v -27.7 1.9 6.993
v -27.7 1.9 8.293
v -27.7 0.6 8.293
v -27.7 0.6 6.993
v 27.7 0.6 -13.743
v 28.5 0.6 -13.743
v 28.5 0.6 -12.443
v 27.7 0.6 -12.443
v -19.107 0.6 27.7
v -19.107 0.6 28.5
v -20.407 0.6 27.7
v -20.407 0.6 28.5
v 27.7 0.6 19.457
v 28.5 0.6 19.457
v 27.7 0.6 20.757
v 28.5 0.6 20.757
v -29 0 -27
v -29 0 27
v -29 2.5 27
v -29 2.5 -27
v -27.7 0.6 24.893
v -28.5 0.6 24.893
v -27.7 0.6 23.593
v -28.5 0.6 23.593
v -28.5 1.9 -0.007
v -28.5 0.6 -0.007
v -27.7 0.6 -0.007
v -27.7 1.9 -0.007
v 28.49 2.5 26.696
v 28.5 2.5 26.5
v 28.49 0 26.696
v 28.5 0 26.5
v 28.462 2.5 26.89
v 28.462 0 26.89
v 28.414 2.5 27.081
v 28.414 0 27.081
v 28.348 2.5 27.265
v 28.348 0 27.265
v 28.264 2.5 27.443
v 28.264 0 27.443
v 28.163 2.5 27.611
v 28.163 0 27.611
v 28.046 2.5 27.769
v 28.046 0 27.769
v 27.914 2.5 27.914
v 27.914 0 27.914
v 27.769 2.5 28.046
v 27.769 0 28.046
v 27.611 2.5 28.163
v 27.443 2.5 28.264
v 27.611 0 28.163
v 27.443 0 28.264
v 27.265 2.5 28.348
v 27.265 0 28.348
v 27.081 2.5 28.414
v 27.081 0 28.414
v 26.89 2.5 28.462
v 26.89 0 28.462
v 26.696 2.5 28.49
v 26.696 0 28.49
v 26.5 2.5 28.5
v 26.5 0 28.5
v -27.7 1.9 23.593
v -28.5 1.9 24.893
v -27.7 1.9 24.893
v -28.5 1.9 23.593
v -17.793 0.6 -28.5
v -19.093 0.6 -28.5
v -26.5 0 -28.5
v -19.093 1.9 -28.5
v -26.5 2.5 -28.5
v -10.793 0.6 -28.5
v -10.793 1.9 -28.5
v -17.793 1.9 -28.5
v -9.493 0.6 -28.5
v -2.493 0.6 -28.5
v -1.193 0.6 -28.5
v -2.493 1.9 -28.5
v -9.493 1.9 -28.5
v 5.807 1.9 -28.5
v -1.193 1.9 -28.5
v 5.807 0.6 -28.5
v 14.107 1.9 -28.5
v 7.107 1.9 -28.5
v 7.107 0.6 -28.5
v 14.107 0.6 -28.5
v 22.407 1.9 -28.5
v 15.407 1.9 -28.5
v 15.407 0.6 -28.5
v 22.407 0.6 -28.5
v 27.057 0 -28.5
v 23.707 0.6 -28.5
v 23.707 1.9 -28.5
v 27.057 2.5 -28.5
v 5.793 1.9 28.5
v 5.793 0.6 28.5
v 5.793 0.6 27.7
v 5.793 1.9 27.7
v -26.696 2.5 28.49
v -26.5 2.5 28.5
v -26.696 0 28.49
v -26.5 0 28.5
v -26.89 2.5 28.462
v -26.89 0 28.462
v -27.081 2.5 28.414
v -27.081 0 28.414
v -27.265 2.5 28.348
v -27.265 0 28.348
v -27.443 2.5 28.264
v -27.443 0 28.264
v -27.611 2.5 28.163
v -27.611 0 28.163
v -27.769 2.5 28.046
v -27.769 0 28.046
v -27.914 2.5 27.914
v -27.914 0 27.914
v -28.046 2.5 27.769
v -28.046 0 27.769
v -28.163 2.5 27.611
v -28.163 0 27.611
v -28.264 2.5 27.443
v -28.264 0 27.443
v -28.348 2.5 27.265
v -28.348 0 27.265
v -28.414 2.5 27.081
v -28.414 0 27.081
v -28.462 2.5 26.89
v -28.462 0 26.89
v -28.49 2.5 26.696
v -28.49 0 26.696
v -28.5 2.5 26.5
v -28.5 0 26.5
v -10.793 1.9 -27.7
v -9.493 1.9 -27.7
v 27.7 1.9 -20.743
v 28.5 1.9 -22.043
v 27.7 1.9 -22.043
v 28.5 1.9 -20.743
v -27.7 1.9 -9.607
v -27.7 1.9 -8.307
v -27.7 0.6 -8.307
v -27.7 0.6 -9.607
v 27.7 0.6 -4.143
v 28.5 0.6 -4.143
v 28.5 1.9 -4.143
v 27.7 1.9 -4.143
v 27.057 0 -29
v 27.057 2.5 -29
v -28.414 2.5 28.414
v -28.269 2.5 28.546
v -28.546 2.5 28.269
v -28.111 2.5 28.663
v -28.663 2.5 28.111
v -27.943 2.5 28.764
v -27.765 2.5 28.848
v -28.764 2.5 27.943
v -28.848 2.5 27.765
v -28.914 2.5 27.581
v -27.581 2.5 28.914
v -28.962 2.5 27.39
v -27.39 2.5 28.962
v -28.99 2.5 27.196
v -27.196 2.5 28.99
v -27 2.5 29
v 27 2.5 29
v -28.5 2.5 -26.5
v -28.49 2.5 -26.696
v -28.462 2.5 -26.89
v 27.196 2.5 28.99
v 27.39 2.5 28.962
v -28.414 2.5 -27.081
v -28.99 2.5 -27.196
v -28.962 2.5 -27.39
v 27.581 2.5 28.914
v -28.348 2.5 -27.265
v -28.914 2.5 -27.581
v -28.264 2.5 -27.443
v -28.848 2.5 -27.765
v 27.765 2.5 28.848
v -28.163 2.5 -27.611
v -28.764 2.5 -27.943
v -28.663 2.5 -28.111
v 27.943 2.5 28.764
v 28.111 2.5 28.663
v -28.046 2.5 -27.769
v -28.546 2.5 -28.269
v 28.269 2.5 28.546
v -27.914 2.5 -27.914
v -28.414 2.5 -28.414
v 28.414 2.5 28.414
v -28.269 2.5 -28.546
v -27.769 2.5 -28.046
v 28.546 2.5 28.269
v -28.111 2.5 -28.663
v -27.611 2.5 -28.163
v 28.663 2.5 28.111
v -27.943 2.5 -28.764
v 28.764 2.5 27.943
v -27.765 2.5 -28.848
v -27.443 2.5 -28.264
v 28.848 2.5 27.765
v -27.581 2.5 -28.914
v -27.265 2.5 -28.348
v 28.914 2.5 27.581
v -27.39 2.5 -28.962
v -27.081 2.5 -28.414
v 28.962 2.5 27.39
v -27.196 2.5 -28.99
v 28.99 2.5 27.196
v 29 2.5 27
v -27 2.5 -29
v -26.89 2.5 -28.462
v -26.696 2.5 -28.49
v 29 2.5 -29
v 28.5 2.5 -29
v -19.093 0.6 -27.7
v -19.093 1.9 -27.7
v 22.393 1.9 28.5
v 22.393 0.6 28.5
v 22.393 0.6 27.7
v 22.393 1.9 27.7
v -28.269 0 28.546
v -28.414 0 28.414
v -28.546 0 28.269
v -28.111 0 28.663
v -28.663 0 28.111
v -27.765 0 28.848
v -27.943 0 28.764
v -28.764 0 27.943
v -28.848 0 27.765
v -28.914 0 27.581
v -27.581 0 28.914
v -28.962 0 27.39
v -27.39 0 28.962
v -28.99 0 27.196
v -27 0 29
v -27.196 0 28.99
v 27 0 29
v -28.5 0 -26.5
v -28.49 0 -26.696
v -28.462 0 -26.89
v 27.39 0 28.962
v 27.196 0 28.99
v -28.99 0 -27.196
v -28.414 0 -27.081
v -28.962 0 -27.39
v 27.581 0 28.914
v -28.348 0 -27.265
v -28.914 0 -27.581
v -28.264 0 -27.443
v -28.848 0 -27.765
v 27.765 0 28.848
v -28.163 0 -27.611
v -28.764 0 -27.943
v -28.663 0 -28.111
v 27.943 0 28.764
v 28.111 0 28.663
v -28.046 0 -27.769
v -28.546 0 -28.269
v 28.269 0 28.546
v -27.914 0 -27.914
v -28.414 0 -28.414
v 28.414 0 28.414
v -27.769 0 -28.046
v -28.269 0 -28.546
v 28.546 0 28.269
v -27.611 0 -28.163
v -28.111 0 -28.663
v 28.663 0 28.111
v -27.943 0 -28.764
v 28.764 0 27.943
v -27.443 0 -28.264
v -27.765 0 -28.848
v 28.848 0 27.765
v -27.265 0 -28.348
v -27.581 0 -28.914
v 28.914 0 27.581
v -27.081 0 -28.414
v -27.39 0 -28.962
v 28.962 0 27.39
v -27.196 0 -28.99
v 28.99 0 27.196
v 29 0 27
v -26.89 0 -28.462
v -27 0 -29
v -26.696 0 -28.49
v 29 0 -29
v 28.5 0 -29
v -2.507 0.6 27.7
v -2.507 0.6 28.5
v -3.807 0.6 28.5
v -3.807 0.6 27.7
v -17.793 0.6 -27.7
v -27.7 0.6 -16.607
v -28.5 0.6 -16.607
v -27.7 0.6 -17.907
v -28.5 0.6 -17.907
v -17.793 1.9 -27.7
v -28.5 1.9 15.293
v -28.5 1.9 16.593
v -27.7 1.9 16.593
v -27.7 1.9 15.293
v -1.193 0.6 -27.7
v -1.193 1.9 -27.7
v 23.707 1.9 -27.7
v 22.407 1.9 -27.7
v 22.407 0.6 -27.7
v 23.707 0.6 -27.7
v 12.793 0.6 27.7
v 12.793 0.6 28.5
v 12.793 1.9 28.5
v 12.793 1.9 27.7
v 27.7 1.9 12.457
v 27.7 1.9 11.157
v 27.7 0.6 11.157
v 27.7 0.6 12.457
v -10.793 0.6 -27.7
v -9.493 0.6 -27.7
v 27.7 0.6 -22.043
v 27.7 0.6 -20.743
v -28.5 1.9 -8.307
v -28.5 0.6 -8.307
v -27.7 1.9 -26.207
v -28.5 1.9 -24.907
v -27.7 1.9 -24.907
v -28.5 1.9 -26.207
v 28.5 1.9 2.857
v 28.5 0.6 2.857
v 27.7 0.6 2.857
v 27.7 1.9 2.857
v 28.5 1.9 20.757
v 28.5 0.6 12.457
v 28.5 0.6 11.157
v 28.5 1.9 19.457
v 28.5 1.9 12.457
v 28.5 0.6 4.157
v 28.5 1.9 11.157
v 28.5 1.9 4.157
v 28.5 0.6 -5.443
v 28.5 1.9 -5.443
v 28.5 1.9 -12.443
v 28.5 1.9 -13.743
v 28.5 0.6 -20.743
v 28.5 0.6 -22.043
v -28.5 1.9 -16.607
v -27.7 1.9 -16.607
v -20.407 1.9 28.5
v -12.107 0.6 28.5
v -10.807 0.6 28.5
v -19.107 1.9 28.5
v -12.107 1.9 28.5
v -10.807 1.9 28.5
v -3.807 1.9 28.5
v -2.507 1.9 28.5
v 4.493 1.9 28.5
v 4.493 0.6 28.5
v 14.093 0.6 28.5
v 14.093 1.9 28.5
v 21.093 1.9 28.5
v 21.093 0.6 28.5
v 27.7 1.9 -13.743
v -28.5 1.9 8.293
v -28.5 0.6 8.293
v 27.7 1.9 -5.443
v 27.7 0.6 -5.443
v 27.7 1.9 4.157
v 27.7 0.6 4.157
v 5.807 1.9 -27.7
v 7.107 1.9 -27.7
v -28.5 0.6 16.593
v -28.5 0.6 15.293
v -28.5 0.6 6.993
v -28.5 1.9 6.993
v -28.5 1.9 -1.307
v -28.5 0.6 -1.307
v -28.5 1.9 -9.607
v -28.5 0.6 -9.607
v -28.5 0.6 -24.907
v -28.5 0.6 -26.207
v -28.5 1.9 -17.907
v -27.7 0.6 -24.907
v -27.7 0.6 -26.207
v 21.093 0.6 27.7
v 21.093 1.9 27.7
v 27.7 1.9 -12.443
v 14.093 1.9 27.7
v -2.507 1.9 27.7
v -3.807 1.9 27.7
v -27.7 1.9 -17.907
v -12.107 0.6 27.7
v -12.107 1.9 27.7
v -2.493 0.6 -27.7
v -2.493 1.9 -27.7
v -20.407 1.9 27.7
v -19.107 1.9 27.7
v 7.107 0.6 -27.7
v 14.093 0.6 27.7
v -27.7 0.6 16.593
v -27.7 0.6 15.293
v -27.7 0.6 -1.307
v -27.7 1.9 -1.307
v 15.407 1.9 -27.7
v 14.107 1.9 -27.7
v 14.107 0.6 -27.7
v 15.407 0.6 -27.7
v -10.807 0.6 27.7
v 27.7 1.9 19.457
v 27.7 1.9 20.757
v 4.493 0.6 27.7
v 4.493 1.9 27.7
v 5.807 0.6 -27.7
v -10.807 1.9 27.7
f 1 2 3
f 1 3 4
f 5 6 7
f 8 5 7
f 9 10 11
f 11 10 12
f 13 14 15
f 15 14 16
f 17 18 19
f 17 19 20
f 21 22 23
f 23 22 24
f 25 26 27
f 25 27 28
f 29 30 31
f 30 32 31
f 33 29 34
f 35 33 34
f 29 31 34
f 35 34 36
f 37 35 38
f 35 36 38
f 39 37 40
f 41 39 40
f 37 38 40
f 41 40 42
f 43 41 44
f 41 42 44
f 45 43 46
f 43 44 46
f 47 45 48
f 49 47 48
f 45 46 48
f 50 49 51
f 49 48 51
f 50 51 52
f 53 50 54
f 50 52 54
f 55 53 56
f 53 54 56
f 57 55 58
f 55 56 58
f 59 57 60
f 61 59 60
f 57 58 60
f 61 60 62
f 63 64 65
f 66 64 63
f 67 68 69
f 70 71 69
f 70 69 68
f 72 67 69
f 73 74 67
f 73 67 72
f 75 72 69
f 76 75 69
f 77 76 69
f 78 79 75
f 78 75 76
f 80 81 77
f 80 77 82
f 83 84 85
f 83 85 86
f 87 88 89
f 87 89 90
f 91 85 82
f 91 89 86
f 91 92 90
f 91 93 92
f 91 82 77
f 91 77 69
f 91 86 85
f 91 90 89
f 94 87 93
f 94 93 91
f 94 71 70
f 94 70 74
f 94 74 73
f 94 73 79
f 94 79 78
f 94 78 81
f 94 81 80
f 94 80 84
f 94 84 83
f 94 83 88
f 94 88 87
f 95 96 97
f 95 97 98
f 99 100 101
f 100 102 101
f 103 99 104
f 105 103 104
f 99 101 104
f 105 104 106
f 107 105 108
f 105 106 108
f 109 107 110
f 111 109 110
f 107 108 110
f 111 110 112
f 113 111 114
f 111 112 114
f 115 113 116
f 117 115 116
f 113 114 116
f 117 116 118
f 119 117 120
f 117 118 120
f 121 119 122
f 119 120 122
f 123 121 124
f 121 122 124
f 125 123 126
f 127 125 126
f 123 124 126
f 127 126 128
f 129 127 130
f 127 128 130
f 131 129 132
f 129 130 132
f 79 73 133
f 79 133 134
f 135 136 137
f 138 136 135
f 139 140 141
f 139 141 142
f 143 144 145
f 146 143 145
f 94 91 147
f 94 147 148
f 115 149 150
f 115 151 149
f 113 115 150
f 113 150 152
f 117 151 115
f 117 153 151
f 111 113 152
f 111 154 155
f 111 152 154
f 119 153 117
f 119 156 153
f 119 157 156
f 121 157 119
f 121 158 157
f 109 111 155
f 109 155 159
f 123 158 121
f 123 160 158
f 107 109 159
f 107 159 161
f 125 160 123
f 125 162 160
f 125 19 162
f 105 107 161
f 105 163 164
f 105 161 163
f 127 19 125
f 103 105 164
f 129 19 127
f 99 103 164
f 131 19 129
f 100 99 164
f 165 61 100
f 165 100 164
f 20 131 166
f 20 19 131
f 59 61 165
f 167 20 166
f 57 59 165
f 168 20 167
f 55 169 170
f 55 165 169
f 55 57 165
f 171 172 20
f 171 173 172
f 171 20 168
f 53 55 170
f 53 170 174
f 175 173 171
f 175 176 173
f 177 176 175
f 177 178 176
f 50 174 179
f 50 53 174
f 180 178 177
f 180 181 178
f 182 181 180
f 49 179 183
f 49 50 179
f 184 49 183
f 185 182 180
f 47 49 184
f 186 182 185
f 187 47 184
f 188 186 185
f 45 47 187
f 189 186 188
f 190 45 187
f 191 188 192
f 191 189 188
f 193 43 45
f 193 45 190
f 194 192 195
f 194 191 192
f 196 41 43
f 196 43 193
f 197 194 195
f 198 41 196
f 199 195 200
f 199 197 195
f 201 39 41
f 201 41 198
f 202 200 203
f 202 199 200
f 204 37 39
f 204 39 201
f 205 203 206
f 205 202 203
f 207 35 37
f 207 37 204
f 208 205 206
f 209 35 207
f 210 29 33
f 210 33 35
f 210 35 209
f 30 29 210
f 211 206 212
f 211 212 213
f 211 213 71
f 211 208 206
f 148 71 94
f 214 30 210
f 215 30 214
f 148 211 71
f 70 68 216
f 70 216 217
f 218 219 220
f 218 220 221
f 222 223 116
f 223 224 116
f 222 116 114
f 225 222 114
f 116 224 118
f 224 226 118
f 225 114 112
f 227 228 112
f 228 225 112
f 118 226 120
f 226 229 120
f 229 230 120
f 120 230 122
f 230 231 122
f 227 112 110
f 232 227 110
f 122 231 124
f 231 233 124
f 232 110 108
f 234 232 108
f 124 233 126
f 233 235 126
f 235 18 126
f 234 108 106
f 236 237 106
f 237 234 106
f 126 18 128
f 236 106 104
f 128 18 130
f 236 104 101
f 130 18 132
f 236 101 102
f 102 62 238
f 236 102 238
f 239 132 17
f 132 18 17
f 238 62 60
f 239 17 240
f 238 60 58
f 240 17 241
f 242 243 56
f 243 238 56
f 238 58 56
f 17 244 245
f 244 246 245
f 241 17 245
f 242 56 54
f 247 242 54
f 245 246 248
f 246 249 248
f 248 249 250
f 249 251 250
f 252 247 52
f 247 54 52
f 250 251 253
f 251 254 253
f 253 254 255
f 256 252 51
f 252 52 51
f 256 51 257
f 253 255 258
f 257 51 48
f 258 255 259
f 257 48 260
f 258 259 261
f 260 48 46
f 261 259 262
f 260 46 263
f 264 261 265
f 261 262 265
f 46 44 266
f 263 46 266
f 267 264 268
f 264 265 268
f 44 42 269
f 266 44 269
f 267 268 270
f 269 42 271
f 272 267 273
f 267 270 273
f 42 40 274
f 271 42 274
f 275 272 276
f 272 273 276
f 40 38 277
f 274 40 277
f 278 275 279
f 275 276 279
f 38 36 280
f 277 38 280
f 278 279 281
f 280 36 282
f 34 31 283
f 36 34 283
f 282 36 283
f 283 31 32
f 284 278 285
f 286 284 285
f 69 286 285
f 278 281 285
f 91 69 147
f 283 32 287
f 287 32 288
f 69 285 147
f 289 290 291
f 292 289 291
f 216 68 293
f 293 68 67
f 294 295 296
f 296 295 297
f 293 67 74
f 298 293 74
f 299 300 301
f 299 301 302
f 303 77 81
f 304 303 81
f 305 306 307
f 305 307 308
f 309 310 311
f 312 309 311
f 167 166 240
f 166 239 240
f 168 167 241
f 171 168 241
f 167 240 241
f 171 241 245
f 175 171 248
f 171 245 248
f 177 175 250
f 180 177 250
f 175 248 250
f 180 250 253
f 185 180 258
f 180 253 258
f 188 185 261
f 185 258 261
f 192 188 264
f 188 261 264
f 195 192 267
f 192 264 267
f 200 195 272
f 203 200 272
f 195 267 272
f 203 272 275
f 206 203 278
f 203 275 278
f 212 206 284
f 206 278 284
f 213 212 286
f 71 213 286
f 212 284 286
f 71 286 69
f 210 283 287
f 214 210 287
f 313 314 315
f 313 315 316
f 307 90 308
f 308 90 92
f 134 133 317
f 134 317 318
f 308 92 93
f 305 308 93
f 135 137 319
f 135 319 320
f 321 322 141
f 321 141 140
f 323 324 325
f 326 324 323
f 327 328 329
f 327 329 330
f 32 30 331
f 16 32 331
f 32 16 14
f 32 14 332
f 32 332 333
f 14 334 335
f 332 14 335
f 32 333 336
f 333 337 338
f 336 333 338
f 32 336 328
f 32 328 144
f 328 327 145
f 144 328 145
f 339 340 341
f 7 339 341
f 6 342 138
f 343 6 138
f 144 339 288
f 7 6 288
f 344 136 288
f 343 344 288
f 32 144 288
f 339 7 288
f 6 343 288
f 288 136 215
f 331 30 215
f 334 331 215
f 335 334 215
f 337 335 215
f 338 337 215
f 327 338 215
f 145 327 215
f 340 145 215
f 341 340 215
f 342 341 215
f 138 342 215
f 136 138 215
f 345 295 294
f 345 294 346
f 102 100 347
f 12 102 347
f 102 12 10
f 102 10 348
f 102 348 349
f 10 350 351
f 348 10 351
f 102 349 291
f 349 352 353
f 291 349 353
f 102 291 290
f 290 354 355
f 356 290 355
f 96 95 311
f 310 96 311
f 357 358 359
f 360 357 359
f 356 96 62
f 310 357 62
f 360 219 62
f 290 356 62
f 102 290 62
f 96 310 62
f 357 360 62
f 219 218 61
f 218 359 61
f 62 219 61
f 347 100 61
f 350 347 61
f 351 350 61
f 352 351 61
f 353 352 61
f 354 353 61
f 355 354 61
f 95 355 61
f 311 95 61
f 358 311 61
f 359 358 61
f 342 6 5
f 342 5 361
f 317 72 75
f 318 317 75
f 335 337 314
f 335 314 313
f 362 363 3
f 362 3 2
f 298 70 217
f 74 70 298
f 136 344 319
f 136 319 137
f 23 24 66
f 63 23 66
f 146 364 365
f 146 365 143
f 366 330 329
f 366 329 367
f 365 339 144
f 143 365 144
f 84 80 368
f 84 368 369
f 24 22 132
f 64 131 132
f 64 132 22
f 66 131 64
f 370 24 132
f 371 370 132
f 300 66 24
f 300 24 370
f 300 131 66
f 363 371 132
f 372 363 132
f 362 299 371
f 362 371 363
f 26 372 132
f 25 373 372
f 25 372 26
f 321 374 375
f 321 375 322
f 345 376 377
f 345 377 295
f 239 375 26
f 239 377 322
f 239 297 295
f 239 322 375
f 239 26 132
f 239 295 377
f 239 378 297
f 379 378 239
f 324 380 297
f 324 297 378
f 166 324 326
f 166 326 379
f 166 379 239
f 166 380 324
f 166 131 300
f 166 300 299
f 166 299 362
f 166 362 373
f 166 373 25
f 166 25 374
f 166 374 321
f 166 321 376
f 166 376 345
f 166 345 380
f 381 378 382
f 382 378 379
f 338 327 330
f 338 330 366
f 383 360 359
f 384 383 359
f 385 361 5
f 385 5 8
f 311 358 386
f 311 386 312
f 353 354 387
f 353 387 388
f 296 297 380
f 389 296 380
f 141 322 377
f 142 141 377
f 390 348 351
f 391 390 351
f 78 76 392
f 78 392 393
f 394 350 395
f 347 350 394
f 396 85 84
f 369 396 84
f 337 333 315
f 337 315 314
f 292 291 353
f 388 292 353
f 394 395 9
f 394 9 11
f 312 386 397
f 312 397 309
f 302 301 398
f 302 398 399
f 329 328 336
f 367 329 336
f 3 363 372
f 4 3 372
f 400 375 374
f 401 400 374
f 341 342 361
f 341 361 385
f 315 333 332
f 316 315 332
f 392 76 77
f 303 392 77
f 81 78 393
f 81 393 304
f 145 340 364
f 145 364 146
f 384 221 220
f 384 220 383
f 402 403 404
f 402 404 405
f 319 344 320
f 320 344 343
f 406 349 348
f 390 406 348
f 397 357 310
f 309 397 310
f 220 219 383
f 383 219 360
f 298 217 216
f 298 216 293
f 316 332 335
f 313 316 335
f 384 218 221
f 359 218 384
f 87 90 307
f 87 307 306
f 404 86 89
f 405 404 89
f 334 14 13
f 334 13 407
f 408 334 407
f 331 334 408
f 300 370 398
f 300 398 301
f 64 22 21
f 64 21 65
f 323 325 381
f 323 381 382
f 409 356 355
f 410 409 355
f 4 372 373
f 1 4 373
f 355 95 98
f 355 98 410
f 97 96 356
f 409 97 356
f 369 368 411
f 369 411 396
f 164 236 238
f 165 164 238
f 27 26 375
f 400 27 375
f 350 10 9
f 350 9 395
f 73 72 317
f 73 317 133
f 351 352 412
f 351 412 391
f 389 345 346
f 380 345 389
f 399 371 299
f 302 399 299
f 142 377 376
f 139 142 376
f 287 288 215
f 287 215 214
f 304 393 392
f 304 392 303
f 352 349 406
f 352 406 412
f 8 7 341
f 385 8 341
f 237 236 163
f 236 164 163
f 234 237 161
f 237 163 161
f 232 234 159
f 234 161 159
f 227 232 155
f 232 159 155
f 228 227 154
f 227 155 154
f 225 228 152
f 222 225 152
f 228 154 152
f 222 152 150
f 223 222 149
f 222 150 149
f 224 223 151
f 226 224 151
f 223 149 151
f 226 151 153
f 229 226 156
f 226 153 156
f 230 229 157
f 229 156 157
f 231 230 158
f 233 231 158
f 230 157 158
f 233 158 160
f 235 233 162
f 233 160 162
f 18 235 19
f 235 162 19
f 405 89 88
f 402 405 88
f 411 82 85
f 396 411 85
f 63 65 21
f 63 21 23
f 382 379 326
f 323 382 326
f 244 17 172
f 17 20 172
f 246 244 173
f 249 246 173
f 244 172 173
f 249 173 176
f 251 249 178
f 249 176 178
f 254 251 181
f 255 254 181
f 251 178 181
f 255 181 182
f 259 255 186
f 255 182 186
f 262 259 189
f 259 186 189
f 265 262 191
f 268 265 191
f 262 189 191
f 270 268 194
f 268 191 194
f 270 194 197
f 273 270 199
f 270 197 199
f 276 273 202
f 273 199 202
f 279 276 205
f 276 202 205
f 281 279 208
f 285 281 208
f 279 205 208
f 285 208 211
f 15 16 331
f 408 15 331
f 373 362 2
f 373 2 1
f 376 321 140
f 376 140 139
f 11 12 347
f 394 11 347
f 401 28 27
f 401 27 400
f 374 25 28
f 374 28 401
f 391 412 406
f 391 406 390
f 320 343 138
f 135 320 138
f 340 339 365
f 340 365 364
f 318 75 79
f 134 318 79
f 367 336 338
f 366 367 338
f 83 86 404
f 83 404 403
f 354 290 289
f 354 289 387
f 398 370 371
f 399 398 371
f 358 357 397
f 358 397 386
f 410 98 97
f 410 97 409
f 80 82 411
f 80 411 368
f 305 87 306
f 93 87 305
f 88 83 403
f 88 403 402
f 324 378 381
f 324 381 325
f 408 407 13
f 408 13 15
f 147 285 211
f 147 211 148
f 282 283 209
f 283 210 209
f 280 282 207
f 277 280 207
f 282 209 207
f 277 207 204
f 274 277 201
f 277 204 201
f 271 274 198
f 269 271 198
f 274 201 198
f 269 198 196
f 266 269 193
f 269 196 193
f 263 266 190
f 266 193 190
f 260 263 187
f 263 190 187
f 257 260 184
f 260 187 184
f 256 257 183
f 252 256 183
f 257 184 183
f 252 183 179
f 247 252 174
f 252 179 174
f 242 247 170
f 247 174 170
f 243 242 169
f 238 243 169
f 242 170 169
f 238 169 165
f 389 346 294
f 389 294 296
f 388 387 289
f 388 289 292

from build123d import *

# Parameters (mm, degrees)
SKETCH_1_W               = 58
SKETCH_1_H               = 58
EXTRUDE_1_DEPTH          = 2.5
SKETCH_2_W               = 57
SKETCH_2_H               = 57
CUT_EXTRUDE_7_DEPTH      = 1
CUT_EXTRUDE_7_DEPTH_BACK = 3.5
SKETCH_5_W               = 1.4427437
SKETCH_5_H               = 2.5
CUT_EXTRUDE_8_DEPTH      = 1.5
SKETCH_6_W               = 1.3
SKETCH_6_H               = 1.3
EXTRUDE_5_DEPTH          = 0.8
FILLET_4_R               = 2
FILLET_5_R               = 2
SKETCH_8_W               = 1.3
SKETCH_8_H               = 1.3
EXTRUDE_6_DEPTH          = 0.8
SKETCH_10_W              = 1.3
SKETCH_10_H              = 1.3
EXTRUDE_8_DEPTH          = 0.8
SKETCH_12_W              = 1.3
SKETCH_12_H              = 1.3
EXTRUDE_9_DEPTH          = 0.8


with BuildPart() as part:
    # 草图1 → 凸台-拉伸1 (new body)
    with BuildSketch(Plane(origin=(0, 0, 0), x_dir=(1, 0, 0), z_dir=(0, 1, 0))):
        Rectangle(SKETCH_1_W, SKETCH_1_H)
    extrude(amount=EXTRUDE_1_DEPTH)

    # 草图2 → 切除-拉伸7 (cut, two sides)
    with BuildSketch(Plane(origin=(0, 2.5, 0), x_dir=(1, 0, 0), z_dir=(0, 1, 0))) as cut_extrude_7_sk:
        Rectangle(SKETCH_2_W, SKETCH_2_H)
    extrude(amount=CUT_EXTRUDE_7_DEPTH, mode=Mode.SUBTRACT)
    extrude(cut_extrude_7_sk.sketch, amount=-CUT_EXTRUDE_7_DEPTH_BACK, mode=Mode.SUBTRACT)

    # 草图5 → 切除-拉伸8 (cut, through all)
    with BuildSketch(Plane.XY.offset(-28.5)):
        with Locations((27.77862815, 1.25)):
            Rectangle(SKETCH_5_W, SKETCH_5_H)
    extrude(amount=-CUT_EXTRUDE_8_DEPTH, mode=Mode.SUBTRACT)

    # 草图6 → 凸台-拉伸5 (add)
    with BuildSketch(Plane.XY.offset(-28.5)):
        with Locations((14.7572563, 1.25)):
            Rectangle(SKETCH_6_W, SKETCH_6_H)
        with Locations((23.0572563, 1.25)):
            Rectangle(SKETCH_6_W, SKETCH_6_H)
        with Locations((6.4572563, 1.25)):
            Rectangle(SKETCH_6_W, SKETCH_6_H)
        with Locations((-1.8427437, 1.25)):
            Rectangle(SKETCH_6_W, SKETCH_6_H)
        with Locations((-10.1427437, 1.25)):
            Rectangle(SKETCH_6_W, SKETCH_6_H)
        with Locations((-18.4427437, 1.25)):
            Rectangle(SKETCH_6_W, SKETCH_6_H)
    extrude(amount=EXTRUDE_5_DEPTH)

    # 圆角4
    fillet_4_edges = [part.edges().sort_by_distance(p)[0] for p in [
        (28.5, 1.25, 28.5),
        (-28.5, 1.25, 28.5),
        (-28.5, 1.25, -28.5),
    ]]
    fillet(fillet_4_edges, radius=FILLET_4_R)

    # 圆角5
    fillet_5_edges = [part.edges().sort_by_distance(p)[0] for p in [
        (29, 1.25, 29),
        (-29, 1.25, 29),
        (-29, 1.25, -29),
    ]]
    fillet(fillet_5_edges, radius=FILLET_5_R)

    # 草图8 → 凸台-拉伸6 (add)
    with BuildSketch(Plane(origin=(-28.5, 0, 0), x_dir=(0, 0, -1), z_dir=(1, 0, 0))):
        with Locations((17.2572563, 1.25)):
            Rectangle(SKETCH_8_W, SKETCH_8_H)
        with Locations((25.5572563, 1.25)):
            Rectangle(SKETCH_8_W, SKETCH_8_H)
        with Locations((8.9572563, 1.25)):
            Rectangle(SKETCH_8_W, SKETCH_8_H)
        with Locations((0.6572563, 1.25)):
            Rectangle(SKETCH_8_W, SKETCH_8_H)
        with Locations((-7.6427437, 1.25)):
            Rectangle(SKETCH_8_W, SKETCH_8_H)
        with Locations((-15.9427437, 1.25)):
            Rectangle(SKETCH_8_W, SKETCH_8_H)
        with Locations((-24.2427437, 1.25)):
            Rectangle(SKETCH_8_W, SKETCH_8_H)
    extrude(amount=EXTRUDE_6_DEPTH)

    # 草图10 → 凸台-拉伸8 (add)
    with BuildSketch(Plane(origin=(0, 0, 28.5), x_dir=(-1, 0, 0), z_dir=(0, 0, -1))):
        with Locations((19.7572563, 1.25)):
            Rectangle(SKETCH_10_W, SKETCH_10_H)
        with Locations((11.4572563, 1.25)):
            Rectangle(SKETCH_10_W, SKETCH_10_H)
        with Locations((3.1572563, 1.25)):
            Rectangle(SKETCH_10_W, SKETCH_10_H)
        with Locations((-5.1427437, 1.25)):
            Rectangle(SKETCH_10_W, SKETCH_10_H)
        with Locations((-13.4427437, 1.25)):
            Rectangle(SKETCH_10_W, SKETCH_10_H)
        with Locations((-21.7427437, 1.25)):
            Rectangle(SKETCH_10_W, SKETCH_10_H)
    extrude(amount=EXTRUDE_8_DEPTH)

    # 草图12 → 凸台-拉伸9 (add)
    with BuildSketch(Plane.ZY.offset(-28.5)):
        with Locations((20.1072563, 1.25)):
            Rectangle(SKETCH_12_W, SKETCH_12_H)
        with Locations((11.8072563, 1.25)):
            Rectangle(SKETCH_12_W, SKETCH_12_H)
        with Locations((3.5072563, 1.25)):
            Rectangle(SKETCH_12_W, SKETCH_12_H)
        with Locations((-4.7927437, 1.25)):
            Rectangle(SKETCH_12_W, SKETCH_12_H)
        with Locations((-13.0927437, 1.25)):
            Rectangle(SKETCH_12_W, SKETCH_12_H)
        with Locations((-21.3927437, 1.25)):
            Rectangle(SKETCH_12_W, SKETCH_12_H)
    extrude(amount=EXTRUDE_9_DEPTH)


solid = part.part
